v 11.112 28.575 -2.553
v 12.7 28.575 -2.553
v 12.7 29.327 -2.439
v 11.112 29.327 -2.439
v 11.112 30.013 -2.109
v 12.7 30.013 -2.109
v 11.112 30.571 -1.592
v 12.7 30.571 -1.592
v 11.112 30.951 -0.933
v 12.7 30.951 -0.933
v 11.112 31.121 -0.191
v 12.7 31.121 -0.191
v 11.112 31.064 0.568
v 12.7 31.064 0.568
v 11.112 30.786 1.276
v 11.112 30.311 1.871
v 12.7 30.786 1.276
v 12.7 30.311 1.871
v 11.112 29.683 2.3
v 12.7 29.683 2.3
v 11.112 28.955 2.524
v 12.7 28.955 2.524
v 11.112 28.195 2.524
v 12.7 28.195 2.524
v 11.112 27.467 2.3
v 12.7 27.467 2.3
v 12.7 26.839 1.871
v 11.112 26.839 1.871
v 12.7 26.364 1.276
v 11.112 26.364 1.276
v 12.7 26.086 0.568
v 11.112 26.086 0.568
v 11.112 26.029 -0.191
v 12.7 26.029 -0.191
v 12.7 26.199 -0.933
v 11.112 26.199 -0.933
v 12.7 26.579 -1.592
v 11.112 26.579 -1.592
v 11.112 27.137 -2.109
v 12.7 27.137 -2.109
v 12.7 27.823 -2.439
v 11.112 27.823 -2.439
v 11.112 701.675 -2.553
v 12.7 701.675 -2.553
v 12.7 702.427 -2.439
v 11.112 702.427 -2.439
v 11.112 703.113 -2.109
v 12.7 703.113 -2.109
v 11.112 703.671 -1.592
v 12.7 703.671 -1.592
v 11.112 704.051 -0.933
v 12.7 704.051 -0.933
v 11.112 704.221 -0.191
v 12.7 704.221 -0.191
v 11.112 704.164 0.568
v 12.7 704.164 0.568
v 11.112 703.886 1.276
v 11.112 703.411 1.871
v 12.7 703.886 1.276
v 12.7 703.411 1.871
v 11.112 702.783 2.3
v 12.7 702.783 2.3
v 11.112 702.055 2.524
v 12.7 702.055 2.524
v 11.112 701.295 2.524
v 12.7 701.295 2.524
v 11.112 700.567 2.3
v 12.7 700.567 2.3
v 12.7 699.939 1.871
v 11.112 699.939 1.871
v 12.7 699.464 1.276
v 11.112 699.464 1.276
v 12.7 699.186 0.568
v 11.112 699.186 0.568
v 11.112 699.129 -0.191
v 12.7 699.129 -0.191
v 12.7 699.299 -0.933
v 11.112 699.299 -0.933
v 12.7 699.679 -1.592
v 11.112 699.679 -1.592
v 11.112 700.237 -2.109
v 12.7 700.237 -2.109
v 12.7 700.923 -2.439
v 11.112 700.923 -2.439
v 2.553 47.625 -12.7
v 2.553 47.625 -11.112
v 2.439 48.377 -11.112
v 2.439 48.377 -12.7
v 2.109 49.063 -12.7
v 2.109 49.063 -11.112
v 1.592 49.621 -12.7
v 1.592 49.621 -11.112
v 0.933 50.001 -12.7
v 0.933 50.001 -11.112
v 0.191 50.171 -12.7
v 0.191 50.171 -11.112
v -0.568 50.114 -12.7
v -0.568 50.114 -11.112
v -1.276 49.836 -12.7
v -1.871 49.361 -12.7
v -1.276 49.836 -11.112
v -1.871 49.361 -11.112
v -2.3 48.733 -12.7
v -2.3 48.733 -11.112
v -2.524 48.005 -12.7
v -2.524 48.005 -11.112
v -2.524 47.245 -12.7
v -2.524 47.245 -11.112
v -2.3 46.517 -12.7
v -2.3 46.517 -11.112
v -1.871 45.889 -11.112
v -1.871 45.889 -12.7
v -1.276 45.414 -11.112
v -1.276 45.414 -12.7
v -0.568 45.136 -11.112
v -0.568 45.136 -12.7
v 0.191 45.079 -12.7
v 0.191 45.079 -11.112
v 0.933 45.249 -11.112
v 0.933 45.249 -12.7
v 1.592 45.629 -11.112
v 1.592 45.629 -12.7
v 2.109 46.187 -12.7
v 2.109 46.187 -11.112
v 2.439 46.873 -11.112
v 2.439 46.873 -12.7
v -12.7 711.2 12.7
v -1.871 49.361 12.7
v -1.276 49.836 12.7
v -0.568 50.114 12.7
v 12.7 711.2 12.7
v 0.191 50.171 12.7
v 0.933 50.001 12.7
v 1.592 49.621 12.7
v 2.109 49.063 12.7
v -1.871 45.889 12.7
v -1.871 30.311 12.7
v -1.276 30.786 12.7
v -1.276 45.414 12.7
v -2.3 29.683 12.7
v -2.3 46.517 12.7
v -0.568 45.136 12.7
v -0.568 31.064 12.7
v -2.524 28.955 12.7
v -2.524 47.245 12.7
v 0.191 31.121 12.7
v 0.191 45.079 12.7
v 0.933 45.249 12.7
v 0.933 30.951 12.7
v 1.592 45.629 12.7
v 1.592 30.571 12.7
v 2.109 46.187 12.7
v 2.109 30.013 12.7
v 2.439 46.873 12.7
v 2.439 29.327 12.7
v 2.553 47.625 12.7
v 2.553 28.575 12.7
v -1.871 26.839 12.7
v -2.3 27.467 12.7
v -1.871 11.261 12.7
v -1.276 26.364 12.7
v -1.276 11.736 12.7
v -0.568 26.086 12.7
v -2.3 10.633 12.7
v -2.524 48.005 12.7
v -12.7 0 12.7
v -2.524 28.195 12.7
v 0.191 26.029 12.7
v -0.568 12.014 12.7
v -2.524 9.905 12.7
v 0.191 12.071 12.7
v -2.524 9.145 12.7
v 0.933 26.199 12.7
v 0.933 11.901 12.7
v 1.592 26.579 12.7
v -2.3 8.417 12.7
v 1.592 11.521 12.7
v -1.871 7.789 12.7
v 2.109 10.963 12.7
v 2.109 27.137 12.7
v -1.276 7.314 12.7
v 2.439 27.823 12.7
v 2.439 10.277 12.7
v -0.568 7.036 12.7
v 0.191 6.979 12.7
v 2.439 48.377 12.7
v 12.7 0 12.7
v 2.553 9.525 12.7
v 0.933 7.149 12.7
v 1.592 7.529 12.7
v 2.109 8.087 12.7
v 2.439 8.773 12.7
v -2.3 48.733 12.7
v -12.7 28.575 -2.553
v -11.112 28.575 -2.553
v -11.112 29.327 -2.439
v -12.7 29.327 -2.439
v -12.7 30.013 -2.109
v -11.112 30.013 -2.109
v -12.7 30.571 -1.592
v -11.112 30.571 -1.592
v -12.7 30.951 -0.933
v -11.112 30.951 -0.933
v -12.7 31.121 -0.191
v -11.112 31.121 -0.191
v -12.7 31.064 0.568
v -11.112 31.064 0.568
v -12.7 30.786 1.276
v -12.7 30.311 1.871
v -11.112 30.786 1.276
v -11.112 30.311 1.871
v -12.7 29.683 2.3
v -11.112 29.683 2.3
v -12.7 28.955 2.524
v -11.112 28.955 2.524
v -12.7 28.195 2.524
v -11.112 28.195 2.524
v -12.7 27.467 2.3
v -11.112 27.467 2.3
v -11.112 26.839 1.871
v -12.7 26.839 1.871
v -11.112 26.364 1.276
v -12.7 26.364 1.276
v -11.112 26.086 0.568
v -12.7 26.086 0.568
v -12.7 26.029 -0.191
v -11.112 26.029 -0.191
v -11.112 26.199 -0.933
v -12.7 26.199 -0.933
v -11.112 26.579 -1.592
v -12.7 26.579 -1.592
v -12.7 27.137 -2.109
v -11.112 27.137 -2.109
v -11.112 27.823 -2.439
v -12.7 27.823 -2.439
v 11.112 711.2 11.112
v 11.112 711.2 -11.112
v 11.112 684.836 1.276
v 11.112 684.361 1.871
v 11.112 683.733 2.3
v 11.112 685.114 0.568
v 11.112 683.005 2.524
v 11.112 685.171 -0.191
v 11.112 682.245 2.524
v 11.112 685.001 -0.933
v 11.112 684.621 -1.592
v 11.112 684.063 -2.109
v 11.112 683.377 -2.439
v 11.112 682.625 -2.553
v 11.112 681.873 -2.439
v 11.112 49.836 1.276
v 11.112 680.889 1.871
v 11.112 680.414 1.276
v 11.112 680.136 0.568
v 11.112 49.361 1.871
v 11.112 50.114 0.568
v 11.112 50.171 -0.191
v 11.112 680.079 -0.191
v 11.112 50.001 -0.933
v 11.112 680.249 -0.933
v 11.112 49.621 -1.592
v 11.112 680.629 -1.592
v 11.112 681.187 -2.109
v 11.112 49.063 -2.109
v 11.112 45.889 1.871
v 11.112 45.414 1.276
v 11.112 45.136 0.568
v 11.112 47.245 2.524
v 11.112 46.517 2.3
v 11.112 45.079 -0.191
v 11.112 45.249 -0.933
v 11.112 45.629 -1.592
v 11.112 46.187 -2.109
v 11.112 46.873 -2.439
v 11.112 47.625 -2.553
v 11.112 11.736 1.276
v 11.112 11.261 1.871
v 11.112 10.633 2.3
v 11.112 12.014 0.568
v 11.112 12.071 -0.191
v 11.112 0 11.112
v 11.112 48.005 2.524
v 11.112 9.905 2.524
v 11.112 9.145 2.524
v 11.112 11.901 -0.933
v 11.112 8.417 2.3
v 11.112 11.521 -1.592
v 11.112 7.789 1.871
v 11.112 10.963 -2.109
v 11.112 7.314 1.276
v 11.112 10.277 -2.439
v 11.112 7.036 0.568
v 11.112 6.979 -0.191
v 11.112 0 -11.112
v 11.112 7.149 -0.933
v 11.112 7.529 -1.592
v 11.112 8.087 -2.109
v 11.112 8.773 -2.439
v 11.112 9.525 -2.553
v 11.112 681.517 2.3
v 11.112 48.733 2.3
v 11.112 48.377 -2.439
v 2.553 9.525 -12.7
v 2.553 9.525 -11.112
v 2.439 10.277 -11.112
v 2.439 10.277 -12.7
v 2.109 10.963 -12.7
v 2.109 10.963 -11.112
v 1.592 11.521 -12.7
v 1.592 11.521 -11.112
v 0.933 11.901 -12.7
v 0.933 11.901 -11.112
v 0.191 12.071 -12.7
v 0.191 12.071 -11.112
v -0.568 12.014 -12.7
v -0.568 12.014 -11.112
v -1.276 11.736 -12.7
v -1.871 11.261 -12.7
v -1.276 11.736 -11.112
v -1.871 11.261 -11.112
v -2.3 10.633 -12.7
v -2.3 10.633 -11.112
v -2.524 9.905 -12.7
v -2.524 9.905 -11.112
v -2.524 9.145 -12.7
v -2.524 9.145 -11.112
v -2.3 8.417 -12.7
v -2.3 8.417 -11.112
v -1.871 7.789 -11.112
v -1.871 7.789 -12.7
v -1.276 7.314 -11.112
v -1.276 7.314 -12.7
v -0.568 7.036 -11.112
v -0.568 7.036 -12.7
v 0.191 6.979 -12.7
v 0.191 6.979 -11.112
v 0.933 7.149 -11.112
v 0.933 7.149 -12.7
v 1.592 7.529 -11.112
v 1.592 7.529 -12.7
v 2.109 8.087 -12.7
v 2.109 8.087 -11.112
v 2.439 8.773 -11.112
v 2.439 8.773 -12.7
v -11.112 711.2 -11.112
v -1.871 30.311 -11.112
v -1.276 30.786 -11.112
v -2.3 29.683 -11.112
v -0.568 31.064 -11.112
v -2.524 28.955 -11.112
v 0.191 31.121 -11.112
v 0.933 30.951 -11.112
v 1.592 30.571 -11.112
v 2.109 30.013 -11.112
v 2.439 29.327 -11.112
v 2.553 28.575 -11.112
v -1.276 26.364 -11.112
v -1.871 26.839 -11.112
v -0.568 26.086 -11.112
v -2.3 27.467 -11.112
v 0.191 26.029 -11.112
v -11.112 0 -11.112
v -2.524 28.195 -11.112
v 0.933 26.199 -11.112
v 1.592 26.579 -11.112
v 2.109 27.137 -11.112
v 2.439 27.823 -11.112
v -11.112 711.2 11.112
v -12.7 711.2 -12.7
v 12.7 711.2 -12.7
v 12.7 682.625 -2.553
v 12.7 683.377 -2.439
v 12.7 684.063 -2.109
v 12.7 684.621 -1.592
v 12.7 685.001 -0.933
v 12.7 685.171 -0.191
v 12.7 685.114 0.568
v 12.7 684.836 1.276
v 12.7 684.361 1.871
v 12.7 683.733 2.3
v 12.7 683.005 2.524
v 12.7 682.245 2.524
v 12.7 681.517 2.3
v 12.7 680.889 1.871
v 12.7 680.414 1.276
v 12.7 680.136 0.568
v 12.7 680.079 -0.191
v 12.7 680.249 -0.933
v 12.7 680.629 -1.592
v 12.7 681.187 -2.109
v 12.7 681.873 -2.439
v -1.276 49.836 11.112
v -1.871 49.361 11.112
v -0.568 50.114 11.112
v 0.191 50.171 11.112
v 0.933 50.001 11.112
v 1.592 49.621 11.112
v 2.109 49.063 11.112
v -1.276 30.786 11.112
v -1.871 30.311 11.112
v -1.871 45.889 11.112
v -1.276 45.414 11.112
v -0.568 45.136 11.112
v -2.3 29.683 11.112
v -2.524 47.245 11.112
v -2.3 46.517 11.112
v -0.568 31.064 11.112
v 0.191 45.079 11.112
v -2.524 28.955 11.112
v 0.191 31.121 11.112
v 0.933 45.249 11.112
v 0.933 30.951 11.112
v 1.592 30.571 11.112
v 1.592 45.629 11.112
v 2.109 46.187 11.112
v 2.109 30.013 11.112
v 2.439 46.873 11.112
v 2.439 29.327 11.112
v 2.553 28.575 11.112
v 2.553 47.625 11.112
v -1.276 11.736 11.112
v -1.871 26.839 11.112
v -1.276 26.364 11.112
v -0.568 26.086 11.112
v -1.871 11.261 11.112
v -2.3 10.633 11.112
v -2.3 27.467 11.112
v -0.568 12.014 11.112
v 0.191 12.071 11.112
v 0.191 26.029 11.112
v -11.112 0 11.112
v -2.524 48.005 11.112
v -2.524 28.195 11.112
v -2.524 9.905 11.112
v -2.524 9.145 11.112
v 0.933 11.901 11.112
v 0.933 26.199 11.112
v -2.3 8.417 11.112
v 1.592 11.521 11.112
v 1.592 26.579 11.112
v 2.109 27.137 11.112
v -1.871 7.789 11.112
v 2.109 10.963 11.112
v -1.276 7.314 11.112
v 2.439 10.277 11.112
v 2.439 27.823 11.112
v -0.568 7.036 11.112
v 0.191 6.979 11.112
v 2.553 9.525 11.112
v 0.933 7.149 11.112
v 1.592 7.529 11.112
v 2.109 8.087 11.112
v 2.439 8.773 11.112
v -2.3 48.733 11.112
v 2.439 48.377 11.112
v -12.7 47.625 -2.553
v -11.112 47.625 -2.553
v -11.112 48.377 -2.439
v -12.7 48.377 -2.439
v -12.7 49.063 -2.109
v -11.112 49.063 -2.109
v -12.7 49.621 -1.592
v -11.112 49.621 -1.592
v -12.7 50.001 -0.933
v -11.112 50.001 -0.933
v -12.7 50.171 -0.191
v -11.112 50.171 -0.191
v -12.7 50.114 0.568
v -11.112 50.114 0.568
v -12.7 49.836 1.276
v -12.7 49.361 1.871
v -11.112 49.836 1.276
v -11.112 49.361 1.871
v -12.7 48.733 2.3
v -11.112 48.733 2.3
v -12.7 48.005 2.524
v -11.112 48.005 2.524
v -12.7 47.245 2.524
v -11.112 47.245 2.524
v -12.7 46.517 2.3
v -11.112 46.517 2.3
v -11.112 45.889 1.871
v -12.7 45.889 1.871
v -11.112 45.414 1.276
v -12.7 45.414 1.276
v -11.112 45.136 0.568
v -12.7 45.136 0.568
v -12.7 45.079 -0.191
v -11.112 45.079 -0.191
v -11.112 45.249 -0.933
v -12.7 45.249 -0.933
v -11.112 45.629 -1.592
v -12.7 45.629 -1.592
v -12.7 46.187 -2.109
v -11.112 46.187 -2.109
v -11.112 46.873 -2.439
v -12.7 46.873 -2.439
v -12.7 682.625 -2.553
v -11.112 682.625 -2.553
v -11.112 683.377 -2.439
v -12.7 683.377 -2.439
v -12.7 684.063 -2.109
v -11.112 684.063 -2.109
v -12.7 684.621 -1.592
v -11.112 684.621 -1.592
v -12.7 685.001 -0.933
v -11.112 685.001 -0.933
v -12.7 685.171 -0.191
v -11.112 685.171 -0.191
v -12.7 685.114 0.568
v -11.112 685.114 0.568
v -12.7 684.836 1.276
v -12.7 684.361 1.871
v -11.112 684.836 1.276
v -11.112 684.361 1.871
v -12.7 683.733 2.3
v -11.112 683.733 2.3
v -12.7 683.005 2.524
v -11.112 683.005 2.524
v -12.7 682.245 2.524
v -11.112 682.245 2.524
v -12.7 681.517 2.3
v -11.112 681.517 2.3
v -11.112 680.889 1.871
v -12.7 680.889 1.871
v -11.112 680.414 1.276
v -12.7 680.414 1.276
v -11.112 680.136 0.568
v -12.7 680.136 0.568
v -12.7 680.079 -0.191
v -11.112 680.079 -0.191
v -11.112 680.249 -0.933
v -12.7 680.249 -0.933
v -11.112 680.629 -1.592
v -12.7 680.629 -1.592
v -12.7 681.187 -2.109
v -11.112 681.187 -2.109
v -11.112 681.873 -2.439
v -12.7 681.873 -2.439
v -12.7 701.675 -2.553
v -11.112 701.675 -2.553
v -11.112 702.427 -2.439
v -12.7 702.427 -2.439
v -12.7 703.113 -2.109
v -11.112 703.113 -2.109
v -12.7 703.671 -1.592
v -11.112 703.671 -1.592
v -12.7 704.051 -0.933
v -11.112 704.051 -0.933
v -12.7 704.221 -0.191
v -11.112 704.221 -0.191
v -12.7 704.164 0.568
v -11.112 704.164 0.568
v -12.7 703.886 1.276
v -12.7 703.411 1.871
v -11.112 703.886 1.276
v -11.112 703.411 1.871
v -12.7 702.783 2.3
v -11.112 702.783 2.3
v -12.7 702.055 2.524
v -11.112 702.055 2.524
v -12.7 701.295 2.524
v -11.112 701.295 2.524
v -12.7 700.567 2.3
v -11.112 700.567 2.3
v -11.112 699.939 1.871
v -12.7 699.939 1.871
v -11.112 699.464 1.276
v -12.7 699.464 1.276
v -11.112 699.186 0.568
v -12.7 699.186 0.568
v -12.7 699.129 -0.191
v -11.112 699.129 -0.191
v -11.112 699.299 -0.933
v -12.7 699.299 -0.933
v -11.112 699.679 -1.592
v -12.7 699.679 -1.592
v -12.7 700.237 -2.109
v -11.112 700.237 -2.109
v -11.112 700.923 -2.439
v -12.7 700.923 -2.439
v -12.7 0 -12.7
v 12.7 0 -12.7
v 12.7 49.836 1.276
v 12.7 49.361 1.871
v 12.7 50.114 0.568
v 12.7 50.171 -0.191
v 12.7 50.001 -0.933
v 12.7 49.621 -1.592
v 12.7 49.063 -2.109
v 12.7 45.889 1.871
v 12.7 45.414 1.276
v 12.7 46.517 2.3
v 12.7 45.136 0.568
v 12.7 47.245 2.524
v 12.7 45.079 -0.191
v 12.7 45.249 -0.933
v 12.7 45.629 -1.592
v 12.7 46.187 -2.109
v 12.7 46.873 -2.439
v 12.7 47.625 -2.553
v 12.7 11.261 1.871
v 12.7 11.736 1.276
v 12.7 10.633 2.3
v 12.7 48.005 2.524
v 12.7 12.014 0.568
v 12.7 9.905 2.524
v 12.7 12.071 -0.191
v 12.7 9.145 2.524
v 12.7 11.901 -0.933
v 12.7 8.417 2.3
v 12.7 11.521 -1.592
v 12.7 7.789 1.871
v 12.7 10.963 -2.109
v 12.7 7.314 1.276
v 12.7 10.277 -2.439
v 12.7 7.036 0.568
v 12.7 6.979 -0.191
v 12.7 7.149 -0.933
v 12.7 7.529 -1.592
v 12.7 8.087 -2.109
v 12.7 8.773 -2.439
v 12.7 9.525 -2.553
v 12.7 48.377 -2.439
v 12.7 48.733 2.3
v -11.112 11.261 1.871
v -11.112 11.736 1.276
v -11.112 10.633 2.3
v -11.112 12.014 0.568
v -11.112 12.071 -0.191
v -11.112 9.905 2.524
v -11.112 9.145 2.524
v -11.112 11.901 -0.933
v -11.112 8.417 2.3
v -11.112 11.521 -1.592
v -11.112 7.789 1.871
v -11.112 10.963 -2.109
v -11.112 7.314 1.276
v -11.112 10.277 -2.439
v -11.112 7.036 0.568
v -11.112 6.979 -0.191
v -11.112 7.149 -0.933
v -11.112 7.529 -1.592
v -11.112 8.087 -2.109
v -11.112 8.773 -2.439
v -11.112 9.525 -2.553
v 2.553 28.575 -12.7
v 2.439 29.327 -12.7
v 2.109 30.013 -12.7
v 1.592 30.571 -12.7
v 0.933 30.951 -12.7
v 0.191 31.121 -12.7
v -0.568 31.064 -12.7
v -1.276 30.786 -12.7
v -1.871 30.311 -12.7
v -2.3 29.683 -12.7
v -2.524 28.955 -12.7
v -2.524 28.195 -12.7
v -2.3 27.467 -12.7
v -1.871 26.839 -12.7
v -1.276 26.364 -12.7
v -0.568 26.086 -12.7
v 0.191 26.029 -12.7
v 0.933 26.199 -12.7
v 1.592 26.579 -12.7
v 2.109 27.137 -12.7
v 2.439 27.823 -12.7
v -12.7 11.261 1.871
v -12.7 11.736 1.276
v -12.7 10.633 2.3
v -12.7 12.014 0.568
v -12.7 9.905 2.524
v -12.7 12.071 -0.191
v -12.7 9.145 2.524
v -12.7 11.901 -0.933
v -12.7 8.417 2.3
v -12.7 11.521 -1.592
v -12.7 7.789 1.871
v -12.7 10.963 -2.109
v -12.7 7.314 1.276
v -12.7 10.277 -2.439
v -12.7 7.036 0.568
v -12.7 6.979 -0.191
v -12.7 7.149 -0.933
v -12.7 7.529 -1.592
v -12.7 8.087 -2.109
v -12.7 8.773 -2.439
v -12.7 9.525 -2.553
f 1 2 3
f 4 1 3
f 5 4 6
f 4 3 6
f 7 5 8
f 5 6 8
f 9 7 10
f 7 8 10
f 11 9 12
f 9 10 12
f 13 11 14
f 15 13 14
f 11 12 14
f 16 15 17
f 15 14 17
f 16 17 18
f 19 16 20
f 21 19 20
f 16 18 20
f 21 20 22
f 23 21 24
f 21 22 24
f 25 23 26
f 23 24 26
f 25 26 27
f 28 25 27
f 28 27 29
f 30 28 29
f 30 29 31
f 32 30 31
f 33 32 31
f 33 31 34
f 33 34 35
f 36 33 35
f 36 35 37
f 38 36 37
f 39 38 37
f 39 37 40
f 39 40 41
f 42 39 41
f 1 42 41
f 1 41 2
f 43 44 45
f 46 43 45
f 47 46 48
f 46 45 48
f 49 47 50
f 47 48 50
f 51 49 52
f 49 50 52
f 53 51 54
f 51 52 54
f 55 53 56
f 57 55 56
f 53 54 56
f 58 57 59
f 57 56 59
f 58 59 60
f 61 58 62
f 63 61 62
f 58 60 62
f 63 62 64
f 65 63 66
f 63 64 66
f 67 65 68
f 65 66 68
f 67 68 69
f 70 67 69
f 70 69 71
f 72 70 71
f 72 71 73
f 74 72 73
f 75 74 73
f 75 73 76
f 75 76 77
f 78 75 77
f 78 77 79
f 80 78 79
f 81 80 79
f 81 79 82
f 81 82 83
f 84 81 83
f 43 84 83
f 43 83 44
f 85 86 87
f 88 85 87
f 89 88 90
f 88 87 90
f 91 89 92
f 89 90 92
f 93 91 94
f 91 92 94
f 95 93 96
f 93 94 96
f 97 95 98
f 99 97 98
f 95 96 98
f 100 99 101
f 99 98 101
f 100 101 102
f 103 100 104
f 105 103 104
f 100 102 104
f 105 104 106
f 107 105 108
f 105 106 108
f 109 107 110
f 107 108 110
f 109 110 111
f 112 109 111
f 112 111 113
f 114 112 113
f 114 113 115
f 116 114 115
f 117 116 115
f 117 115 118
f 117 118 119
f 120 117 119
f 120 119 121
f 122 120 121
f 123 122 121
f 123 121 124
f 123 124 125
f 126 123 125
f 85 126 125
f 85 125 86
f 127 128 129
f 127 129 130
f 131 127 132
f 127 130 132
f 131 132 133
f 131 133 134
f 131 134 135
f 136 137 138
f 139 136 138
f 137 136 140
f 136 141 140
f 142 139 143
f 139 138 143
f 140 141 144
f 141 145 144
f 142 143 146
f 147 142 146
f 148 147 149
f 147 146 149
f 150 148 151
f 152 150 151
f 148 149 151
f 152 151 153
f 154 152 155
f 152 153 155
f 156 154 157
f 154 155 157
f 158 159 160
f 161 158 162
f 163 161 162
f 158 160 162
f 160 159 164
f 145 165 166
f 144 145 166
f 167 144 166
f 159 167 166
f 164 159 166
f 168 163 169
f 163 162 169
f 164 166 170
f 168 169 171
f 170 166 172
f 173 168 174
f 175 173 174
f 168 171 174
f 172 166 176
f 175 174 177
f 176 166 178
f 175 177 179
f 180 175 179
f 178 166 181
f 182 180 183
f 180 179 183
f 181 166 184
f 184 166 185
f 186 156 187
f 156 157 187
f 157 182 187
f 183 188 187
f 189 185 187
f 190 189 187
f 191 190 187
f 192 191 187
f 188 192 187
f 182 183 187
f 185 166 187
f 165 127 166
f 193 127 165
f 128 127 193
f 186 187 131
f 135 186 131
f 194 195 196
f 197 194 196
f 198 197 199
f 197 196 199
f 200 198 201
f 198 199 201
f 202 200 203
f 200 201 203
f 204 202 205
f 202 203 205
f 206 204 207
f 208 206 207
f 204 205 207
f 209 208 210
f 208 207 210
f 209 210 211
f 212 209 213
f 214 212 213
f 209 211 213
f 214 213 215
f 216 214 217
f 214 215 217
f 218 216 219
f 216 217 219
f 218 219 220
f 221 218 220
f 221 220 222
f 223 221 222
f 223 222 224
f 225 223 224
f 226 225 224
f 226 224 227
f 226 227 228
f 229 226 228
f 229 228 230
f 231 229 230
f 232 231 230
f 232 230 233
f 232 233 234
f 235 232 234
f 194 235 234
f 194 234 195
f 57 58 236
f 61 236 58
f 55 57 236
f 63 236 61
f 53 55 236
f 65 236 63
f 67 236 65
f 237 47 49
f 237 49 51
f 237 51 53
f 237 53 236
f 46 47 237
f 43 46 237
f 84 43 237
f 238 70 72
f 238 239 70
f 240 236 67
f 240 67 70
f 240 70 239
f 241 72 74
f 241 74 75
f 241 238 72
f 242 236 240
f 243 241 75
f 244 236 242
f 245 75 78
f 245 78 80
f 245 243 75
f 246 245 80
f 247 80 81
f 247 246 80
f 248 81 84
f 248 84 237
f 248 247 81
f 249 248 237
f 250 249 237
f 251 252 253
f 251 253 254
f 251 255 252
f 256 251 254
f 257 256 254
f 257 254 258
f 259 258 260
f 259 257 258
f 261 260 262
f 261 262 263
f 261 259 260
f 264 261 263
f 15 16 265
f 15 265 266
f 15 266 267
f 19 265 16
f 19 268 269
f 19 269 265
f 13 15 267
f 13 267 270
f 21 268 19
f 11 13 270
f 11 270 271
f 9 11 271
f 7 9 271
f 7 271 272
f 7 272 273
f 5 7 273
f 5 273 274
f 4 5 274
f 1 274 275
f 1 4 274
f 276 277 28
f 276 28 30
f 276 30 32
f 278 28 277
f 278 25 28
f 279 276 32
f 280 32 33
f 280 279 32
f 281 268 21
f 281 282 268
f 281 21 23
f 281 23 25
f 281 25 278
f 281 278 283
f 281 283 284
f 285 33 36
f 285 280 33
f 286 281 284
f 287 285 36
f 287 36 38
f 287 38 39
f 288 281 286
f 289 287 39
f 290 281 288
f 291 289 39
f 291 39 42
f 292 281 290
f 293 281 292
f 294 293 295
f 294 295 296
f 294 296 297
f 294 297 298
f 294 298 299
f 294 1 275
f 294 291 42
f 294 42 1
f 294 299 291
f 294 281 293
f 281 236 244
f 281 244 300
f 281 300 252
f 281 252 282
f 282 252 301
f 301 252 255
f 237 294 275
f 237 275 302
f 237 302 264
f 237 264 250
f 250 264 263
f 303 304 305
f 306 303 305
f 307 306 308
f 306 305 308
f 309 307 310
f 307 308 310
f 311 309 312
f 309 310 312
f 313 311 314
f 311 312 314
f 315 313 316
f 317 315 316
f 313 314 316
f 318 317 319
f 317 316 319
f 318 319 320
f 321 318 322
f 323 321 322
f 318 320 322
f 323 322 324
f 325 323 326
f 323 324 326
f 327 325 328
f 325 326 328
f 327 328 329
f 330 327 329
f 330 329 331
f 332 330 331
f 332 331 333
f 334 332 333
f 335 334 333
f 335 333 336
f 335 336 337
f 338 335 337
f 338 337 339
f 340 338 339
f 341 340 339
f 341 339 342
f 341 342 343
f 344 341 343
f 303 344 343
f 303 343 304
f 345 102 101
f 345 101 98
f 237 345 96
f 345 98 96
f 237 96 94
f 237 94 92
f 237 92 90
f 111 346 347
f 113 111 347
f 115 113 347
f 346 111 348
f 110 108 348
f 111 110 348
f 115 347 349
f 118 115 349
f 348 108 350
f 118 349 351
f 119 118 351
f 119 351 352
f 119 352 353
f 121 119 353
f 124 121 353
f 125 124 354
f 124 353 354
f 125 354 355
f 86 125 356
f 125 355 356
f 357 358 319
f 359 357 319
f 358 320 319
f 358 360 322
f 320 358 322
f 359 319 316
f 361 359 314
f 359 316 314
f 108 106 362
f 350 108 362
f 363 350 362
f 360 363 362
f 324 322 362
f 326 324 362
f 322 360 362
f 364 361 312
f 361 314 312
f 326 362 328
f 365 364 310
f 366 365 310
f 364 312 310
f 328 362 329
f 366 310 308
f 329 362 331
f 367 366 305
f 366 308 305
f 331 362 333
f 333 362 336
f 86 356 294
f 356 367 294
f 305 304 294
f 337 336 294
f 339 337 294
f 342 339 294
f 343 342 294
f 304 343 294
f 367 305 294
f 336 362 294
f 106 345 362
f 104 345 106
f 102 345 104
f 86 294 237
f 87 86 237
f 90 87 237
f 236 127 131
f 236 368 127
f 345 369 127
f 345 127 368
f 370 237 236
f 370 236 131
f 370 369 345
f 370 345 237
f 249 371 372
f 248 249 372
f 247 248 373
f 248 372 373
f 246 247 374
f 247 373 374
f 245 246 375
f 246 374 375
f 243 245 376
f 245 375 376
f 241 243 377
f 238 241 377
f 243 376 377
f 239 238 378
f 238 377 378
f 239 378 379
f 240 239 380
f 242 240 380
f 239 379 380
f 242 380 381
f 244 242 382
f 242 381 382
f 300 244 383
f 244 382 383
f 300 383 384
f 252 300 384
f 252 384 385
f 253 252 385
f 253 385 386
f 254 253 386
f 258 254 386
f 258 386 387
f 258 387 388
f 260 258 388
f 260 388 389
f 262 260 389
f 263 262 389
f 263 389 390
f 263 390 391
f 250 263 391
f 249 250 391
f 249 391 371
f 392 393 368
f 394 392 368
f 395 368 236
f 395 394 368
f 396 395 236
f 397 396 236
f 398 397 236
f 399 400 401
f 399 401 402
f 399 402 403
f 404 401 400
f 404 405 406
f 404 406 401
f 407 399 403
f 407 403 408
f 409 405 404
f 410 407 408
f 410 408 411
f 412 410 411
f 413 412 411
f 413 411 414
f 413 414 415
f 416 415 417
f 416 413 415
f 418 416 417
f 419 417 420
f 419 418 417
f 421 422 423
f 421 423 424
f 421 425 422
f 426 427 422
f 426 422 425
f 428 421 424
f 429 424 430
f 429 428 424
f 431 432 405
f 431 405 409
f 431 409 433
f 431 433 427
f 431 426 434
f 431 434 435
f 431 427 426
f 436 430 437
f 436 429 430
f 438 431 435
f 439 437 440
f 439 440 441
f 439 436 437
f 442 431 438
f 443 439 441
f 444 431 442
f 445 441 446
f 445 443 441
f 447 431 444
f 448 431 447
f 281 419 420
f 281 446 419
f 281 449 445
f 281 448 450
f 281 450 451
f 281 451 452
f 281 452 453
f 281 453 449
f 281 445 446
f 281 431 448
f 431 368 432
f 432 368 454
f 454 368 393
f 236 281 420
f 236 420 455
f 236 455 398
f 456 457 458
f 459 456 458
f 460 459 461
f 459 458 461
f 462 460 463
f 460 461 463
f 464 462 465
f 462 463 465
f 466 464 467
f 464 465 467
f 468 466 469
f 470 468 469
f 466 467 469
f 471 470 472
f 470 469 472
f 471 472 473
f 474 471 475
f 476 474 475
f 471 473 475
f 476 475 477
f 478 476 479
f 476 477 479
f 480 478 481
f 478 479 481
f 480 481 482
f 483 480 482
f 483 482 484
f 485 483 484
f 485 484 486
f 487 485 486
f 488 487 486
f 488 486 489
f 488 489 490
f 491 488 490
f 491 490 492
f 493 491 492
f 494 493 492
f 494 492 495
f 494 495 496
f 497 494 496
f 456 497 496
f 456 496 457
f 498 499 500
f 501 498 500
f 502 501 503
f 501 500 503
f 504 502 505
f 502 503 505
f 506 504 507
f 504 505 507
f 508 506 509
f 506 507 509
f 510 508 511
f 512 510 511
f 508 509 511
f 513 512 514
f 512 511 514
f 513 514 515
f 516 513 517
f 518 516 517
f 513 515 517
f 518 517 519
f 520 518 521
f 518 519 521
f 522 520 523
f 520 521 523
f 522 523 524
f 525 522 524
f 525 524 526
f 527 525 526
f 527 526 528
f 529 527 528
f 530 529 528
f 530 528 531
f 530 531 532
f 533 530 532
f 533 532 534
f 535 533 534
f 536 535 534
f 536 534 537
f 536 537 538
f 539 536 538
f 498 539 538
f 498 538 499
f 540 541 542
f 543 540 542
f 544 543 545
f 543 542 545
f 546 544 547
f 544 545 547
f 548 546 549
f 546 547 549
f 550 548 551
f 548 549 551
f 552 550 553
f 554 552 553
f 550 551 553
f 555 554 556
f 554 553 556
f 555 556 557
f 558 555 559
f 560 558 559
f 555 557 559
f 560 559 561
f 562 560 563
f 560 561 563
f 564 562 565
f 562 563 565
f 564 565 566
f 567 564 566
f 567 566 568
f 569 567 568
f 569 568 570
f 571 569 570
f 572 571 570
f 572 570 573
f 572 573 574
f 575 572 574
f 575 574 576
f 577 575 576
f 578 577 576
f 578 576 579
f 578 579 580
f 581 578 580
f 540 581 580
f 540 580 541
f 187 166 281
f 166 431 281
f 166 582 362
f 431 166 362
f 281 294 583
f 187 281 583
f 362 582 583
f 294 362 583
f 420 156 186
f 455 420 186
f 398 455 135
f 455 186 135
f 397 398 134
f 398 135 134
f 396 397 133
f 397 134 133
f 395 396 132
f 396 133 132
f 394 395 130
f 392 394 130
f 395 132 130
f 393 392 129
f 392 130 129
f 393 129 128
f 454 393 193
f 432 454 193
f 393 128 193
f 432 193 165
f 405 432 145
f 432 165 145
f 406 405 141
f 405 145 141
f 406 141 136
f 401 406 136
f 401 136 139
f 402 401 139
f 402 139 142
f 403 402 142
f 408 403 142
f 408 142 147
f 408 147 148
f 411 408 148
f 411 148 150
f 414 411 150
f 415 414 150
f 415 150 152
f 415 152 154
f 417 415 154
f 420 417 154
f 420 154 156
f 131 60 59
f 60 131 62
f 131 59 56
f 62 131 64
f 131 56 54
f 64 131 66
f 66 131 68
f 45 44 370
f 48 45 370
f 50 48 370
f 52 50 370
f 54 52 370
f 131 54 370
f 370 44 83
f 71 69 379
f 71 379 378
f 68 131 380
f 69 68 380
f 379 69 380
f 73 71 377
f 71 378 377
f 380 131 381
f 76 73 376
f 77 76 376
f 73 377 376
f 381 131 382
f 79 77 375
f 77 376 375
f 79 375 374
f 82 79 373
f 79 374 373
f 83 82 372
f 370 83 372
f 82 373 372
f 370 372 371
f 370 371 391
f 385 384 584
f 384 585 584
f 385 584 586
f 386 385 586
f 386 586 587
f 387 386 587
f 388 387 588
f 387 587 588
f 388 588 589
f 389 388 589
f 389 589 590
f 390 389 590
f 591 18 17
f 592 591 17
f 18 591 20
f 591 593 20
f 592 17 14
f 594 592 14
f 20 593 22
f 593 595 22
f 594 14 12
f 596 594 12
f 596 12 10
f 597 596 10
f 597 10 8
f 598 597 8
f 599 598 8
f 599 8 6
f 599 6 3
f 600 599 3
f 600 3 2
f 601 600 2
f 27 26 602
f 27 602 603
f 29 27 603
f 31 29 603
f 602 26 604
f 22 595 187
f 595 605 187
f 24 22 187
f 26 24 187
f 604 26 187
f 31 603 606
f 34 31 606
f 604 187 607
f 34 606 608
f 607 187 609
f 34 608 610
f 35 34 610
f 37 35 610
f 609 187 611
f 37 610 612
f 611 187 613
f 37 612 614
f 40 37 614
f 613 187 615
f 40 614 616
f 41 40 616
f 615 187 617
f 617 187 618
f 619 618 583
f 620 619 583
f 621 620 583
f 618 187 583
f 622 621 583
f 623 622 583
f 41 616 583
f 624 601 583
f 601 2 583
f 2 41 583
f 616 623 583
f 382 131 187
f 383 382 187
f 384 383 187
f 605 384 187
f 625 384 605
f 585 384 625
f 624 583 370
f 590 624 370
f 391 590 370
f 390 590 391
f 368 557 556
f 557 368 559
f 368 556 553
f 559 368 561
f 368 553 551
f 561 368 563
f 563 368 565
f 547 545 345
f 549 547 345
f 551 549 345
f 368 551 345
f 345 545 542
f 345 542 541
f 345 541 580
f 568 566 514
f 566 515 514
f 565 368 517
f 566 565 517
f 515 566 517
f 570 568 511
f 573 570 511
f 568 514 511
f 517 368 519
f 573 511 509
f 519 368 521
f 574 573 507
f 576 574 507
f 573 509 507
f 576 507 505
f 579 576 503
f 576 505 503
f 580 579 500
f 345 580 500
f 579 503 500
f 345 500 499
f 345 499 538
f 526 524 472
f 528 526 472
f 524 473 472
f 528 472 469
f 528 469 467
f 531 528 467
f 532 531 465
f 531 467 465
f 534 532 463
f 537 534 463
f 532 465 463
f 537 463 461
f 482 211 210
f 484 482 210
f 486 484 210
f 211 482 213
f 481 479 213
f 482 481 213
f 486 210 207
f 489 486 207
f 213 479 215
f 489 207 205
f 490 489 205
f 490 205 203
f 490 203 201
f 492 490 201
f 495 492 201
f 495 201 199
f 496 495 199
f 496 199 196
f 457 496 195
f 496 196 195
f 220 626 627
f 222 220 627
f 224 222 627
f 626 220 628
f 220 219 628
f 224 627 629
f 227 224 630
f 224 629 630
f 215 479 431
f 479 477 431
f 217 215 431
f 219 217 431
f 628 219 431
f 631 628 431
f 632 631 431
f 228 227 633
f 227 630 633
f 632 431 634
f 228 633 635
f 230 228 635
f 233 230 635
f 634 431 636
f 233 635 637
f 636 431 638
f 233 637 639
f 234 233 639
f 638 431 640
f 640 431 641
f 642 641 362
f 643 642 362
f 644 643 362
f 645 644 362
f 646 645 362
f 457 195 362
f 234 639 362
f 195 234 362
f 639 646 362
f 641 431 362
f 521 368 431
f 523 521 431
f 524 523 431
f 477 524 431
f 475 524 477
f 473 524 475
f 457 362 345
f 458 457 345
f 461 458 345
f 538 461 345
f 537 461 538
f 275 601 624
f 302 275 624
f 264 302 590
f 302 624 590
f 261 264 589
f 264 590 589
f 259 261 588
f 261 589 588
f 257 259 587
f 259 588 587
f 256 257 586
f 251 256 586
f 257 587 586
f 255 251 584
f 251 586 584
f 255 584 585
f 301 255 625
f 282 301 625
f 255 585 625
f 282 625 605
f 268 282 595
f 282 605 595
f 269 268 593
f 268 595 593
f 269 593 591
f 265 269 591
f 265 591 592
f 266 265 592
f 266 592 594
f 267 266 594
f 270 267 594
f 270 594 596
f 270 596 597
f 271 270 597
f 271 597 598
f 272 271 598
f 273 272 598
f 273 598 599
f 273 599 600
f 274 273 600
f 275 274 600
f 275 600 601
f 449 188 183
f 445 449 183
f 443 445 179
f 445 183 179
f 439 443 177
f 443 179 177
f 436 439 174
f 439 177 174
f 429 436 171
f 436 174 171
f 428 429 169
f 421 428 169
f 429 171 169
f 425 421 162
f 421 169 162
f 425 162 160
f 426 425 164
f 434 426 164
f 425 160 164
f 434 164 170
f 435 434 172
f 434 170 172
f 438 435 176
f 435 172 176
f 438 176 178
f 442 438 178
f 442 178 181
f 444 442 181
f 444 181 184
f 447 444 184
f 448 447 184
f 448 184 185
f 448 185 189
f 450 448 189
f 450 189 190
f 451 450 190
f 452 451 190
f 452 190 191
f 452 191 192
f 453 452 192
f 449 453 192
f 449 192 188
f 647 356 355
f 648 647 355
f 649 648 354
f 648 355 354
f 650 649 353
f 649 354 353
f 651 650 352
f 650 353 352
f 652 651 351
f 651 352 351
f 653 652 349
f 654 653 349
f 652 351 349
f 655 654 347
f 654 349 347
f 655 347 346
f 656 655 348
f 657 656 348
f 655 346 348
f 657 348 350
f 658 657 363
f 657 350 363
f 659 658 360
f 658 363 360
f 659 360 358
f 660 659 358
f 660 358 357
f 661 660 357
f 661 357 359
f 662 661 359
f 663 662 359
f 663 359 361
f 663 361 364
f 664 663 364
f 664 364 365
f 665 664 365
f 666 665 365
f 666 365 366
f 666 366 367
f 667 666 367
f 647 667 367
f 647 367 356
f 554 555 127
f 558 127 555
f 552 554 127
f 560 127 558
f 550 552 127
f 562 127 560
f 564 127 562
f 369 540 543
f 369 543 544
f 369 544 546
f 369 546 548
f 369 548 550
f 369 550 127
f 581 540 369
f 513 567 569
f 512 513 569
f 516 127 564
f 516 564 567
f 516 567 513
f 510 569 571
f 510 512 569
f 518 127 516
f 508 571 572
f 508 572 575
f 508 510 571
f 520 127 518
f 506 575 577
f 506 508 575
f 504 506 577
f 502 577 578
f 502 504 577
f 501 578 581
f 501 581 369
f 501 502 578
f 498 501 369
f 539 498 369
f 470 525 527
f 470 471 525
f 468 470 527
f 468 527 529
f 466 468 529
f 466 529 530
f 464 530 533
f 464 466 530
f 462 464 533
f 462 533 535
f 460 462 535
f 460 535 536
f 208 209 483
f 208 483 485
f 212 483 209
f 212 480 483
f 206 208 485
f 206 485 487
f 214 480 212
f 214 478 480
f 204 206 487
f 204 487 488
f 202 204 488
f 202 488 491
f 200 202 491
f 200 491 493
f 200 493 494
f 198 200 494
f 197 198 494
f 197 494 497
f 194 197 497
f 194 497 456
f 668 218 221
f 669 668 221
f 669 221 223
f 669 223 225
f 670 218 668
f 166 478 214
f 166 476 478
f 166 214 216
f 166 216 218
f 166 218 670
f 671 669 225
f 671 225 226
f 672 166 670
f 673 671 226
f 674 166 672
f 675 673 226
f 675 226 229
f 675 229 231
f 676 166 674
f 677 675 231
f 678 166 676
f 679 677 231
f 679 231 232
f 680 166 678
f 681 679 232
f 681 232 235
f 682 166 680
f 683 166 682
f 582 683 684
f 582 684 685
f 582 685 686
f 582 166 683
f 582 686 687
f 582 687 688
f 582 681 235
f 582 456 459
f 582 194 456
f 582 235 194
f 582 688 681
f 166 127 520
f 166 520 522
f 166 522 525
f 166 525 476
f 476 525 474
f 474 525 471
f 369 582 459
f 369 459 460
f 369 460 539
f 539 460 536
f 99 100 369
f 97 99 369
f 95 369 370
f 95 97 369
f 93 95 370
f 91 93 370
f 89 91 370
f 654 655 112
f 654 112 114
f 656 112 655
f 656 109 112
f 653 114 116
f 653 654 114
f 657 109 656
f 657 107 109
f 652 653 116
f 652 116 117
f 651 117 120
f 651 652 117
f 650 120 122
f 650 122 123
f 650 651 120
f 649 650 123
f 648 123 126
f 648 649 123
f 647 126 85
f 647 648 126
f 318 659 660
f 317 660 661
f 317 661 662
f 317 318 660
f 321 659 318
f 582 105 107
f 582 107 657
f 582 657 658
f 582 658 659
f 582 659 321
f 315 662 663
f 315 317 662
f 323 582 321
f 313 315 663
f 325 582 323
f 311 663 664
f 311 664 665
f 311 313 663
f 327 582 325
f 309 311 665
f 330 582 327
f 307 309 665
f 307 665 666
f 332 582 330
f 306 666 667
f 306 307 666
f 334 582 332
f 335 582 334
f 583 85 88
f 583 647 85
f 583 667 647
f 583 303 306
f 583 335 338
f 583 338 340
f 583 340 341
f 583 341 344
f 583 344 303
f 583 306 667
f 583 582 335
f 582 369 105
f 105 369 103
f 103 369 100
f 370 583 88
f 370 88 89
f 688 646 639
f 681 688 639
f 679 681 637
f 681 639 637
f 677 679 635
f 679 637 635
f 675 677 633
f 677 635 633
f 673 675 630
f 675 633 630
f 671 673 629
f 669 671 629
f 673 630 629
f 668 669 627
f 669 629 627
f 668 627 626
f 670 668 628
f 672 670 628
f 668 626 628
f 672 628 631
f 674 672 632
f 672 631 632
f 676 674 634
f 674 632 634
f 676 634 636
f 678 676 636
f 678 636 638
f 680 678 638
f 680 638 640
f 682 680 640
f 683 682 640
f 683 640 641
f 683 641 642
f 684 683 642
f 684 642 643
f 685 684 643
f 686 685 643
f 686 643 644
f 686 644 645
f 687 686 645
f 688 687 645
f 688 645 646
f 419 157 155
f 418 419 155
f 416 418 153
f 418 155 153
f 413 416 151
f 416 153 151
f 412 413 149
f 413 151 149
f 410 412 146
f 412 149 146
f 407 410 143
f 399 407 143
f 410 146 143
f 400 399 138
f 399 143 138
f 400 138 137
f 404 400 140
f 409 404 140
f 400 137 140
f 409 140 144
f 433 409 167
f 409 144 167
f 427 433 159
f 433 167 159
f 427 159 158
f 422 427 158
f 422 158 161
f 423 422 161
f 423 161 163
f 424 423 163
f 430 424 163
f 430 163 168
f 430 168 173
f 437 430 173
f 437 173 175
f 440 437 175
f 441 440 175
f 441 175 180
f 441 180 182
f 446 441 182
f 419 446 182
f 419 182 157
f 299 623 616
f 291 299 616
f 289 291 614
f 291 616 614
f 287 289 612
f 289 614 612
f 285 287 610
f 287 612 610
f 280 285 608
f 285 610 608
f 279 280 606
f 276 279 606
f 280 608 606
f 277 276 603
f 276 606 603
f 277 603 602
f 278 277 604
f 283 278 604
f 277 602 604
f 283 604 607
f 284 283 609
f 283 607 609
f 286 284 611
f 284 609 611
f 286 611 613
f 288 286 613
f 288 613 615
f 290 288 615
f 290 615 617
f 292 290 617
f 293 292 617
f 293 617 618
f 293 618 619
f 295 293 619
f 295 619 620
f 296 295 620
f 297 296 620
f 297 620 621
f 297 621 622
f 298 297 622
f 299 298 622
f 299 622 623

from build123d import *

# Parameters (mm, degrees)
SKETCH1_W           = 25.4
SKETCH1_H           = 25.4
SKETCH1_W_2         = 22.225
SKETCH1_H_2         = 22.225
BOSS_EXTRUDE1_DEPTH = 711.2
SKETCH2_R           = 2.5527
CUT_EXTRUDE1_DEPTH  = 26.4
SKETCH3_R           = 2.5527
CUT_EXTRUDE2_DEPTH  = 26.4


with BuildPart() as part:
    # Sketch1 → Boss-Extrude1 (new body)
    with BuildSketch(Plane(origin=(0, 0, 0), x_dir=(1, 0, 0), z_dir=(0, 1, 0))):
        Rectangle(SKETCH1_W, SKETCH1_H)
        Rectangle(SKETCH1_W_2, SKETCH1_H_2, mode=Mode.SUBTRACT)
    extrude(amount=BOSS_EXTRUDE1_DEPTH)

    # Sketch2 → Cut-Extrude1 (cut, through all)
    with BuildSketch(Plane.XY.offset(12.7)):
        with Locations((0, 9.525)):
            Circle(SKETCH2_R)
        with Locations((0, 28.575)):
            Circle(SKETCH2_R)
        with Locations((0, 47.625)):
            Circle(SKETCH2_R)
    extrude(amount=-CUT_EXTRUDE1_DEPTH, mode=Mode.SUBTRACT)

    # Sketch3 → Cut-Extrude2 (cut, through all)
    with BuildSketch(Plane(origin=(12.7, 0, 0), x_dir=(0, 0, -1), z_dir=(1, 0, 0))):
        with Locations((0, 9.525)):
            Circle(SKETCH3_R)
        with Locations((0, 28.575)):
            Circle(SKETCH3_R)
        with Locations((0, 47.625)):
            Circle(SKETCH3_R)
        with Locations((0, 701.675)):
            Circle(SKETCH3_R)
        with Locations((0, 682.625)):
            Circle(SKETCH3_R)
    extrude(amount=-CUT_EXTRUDE2_DEPTH, mode=Mode.SUBTRACT)


solid = part.part
